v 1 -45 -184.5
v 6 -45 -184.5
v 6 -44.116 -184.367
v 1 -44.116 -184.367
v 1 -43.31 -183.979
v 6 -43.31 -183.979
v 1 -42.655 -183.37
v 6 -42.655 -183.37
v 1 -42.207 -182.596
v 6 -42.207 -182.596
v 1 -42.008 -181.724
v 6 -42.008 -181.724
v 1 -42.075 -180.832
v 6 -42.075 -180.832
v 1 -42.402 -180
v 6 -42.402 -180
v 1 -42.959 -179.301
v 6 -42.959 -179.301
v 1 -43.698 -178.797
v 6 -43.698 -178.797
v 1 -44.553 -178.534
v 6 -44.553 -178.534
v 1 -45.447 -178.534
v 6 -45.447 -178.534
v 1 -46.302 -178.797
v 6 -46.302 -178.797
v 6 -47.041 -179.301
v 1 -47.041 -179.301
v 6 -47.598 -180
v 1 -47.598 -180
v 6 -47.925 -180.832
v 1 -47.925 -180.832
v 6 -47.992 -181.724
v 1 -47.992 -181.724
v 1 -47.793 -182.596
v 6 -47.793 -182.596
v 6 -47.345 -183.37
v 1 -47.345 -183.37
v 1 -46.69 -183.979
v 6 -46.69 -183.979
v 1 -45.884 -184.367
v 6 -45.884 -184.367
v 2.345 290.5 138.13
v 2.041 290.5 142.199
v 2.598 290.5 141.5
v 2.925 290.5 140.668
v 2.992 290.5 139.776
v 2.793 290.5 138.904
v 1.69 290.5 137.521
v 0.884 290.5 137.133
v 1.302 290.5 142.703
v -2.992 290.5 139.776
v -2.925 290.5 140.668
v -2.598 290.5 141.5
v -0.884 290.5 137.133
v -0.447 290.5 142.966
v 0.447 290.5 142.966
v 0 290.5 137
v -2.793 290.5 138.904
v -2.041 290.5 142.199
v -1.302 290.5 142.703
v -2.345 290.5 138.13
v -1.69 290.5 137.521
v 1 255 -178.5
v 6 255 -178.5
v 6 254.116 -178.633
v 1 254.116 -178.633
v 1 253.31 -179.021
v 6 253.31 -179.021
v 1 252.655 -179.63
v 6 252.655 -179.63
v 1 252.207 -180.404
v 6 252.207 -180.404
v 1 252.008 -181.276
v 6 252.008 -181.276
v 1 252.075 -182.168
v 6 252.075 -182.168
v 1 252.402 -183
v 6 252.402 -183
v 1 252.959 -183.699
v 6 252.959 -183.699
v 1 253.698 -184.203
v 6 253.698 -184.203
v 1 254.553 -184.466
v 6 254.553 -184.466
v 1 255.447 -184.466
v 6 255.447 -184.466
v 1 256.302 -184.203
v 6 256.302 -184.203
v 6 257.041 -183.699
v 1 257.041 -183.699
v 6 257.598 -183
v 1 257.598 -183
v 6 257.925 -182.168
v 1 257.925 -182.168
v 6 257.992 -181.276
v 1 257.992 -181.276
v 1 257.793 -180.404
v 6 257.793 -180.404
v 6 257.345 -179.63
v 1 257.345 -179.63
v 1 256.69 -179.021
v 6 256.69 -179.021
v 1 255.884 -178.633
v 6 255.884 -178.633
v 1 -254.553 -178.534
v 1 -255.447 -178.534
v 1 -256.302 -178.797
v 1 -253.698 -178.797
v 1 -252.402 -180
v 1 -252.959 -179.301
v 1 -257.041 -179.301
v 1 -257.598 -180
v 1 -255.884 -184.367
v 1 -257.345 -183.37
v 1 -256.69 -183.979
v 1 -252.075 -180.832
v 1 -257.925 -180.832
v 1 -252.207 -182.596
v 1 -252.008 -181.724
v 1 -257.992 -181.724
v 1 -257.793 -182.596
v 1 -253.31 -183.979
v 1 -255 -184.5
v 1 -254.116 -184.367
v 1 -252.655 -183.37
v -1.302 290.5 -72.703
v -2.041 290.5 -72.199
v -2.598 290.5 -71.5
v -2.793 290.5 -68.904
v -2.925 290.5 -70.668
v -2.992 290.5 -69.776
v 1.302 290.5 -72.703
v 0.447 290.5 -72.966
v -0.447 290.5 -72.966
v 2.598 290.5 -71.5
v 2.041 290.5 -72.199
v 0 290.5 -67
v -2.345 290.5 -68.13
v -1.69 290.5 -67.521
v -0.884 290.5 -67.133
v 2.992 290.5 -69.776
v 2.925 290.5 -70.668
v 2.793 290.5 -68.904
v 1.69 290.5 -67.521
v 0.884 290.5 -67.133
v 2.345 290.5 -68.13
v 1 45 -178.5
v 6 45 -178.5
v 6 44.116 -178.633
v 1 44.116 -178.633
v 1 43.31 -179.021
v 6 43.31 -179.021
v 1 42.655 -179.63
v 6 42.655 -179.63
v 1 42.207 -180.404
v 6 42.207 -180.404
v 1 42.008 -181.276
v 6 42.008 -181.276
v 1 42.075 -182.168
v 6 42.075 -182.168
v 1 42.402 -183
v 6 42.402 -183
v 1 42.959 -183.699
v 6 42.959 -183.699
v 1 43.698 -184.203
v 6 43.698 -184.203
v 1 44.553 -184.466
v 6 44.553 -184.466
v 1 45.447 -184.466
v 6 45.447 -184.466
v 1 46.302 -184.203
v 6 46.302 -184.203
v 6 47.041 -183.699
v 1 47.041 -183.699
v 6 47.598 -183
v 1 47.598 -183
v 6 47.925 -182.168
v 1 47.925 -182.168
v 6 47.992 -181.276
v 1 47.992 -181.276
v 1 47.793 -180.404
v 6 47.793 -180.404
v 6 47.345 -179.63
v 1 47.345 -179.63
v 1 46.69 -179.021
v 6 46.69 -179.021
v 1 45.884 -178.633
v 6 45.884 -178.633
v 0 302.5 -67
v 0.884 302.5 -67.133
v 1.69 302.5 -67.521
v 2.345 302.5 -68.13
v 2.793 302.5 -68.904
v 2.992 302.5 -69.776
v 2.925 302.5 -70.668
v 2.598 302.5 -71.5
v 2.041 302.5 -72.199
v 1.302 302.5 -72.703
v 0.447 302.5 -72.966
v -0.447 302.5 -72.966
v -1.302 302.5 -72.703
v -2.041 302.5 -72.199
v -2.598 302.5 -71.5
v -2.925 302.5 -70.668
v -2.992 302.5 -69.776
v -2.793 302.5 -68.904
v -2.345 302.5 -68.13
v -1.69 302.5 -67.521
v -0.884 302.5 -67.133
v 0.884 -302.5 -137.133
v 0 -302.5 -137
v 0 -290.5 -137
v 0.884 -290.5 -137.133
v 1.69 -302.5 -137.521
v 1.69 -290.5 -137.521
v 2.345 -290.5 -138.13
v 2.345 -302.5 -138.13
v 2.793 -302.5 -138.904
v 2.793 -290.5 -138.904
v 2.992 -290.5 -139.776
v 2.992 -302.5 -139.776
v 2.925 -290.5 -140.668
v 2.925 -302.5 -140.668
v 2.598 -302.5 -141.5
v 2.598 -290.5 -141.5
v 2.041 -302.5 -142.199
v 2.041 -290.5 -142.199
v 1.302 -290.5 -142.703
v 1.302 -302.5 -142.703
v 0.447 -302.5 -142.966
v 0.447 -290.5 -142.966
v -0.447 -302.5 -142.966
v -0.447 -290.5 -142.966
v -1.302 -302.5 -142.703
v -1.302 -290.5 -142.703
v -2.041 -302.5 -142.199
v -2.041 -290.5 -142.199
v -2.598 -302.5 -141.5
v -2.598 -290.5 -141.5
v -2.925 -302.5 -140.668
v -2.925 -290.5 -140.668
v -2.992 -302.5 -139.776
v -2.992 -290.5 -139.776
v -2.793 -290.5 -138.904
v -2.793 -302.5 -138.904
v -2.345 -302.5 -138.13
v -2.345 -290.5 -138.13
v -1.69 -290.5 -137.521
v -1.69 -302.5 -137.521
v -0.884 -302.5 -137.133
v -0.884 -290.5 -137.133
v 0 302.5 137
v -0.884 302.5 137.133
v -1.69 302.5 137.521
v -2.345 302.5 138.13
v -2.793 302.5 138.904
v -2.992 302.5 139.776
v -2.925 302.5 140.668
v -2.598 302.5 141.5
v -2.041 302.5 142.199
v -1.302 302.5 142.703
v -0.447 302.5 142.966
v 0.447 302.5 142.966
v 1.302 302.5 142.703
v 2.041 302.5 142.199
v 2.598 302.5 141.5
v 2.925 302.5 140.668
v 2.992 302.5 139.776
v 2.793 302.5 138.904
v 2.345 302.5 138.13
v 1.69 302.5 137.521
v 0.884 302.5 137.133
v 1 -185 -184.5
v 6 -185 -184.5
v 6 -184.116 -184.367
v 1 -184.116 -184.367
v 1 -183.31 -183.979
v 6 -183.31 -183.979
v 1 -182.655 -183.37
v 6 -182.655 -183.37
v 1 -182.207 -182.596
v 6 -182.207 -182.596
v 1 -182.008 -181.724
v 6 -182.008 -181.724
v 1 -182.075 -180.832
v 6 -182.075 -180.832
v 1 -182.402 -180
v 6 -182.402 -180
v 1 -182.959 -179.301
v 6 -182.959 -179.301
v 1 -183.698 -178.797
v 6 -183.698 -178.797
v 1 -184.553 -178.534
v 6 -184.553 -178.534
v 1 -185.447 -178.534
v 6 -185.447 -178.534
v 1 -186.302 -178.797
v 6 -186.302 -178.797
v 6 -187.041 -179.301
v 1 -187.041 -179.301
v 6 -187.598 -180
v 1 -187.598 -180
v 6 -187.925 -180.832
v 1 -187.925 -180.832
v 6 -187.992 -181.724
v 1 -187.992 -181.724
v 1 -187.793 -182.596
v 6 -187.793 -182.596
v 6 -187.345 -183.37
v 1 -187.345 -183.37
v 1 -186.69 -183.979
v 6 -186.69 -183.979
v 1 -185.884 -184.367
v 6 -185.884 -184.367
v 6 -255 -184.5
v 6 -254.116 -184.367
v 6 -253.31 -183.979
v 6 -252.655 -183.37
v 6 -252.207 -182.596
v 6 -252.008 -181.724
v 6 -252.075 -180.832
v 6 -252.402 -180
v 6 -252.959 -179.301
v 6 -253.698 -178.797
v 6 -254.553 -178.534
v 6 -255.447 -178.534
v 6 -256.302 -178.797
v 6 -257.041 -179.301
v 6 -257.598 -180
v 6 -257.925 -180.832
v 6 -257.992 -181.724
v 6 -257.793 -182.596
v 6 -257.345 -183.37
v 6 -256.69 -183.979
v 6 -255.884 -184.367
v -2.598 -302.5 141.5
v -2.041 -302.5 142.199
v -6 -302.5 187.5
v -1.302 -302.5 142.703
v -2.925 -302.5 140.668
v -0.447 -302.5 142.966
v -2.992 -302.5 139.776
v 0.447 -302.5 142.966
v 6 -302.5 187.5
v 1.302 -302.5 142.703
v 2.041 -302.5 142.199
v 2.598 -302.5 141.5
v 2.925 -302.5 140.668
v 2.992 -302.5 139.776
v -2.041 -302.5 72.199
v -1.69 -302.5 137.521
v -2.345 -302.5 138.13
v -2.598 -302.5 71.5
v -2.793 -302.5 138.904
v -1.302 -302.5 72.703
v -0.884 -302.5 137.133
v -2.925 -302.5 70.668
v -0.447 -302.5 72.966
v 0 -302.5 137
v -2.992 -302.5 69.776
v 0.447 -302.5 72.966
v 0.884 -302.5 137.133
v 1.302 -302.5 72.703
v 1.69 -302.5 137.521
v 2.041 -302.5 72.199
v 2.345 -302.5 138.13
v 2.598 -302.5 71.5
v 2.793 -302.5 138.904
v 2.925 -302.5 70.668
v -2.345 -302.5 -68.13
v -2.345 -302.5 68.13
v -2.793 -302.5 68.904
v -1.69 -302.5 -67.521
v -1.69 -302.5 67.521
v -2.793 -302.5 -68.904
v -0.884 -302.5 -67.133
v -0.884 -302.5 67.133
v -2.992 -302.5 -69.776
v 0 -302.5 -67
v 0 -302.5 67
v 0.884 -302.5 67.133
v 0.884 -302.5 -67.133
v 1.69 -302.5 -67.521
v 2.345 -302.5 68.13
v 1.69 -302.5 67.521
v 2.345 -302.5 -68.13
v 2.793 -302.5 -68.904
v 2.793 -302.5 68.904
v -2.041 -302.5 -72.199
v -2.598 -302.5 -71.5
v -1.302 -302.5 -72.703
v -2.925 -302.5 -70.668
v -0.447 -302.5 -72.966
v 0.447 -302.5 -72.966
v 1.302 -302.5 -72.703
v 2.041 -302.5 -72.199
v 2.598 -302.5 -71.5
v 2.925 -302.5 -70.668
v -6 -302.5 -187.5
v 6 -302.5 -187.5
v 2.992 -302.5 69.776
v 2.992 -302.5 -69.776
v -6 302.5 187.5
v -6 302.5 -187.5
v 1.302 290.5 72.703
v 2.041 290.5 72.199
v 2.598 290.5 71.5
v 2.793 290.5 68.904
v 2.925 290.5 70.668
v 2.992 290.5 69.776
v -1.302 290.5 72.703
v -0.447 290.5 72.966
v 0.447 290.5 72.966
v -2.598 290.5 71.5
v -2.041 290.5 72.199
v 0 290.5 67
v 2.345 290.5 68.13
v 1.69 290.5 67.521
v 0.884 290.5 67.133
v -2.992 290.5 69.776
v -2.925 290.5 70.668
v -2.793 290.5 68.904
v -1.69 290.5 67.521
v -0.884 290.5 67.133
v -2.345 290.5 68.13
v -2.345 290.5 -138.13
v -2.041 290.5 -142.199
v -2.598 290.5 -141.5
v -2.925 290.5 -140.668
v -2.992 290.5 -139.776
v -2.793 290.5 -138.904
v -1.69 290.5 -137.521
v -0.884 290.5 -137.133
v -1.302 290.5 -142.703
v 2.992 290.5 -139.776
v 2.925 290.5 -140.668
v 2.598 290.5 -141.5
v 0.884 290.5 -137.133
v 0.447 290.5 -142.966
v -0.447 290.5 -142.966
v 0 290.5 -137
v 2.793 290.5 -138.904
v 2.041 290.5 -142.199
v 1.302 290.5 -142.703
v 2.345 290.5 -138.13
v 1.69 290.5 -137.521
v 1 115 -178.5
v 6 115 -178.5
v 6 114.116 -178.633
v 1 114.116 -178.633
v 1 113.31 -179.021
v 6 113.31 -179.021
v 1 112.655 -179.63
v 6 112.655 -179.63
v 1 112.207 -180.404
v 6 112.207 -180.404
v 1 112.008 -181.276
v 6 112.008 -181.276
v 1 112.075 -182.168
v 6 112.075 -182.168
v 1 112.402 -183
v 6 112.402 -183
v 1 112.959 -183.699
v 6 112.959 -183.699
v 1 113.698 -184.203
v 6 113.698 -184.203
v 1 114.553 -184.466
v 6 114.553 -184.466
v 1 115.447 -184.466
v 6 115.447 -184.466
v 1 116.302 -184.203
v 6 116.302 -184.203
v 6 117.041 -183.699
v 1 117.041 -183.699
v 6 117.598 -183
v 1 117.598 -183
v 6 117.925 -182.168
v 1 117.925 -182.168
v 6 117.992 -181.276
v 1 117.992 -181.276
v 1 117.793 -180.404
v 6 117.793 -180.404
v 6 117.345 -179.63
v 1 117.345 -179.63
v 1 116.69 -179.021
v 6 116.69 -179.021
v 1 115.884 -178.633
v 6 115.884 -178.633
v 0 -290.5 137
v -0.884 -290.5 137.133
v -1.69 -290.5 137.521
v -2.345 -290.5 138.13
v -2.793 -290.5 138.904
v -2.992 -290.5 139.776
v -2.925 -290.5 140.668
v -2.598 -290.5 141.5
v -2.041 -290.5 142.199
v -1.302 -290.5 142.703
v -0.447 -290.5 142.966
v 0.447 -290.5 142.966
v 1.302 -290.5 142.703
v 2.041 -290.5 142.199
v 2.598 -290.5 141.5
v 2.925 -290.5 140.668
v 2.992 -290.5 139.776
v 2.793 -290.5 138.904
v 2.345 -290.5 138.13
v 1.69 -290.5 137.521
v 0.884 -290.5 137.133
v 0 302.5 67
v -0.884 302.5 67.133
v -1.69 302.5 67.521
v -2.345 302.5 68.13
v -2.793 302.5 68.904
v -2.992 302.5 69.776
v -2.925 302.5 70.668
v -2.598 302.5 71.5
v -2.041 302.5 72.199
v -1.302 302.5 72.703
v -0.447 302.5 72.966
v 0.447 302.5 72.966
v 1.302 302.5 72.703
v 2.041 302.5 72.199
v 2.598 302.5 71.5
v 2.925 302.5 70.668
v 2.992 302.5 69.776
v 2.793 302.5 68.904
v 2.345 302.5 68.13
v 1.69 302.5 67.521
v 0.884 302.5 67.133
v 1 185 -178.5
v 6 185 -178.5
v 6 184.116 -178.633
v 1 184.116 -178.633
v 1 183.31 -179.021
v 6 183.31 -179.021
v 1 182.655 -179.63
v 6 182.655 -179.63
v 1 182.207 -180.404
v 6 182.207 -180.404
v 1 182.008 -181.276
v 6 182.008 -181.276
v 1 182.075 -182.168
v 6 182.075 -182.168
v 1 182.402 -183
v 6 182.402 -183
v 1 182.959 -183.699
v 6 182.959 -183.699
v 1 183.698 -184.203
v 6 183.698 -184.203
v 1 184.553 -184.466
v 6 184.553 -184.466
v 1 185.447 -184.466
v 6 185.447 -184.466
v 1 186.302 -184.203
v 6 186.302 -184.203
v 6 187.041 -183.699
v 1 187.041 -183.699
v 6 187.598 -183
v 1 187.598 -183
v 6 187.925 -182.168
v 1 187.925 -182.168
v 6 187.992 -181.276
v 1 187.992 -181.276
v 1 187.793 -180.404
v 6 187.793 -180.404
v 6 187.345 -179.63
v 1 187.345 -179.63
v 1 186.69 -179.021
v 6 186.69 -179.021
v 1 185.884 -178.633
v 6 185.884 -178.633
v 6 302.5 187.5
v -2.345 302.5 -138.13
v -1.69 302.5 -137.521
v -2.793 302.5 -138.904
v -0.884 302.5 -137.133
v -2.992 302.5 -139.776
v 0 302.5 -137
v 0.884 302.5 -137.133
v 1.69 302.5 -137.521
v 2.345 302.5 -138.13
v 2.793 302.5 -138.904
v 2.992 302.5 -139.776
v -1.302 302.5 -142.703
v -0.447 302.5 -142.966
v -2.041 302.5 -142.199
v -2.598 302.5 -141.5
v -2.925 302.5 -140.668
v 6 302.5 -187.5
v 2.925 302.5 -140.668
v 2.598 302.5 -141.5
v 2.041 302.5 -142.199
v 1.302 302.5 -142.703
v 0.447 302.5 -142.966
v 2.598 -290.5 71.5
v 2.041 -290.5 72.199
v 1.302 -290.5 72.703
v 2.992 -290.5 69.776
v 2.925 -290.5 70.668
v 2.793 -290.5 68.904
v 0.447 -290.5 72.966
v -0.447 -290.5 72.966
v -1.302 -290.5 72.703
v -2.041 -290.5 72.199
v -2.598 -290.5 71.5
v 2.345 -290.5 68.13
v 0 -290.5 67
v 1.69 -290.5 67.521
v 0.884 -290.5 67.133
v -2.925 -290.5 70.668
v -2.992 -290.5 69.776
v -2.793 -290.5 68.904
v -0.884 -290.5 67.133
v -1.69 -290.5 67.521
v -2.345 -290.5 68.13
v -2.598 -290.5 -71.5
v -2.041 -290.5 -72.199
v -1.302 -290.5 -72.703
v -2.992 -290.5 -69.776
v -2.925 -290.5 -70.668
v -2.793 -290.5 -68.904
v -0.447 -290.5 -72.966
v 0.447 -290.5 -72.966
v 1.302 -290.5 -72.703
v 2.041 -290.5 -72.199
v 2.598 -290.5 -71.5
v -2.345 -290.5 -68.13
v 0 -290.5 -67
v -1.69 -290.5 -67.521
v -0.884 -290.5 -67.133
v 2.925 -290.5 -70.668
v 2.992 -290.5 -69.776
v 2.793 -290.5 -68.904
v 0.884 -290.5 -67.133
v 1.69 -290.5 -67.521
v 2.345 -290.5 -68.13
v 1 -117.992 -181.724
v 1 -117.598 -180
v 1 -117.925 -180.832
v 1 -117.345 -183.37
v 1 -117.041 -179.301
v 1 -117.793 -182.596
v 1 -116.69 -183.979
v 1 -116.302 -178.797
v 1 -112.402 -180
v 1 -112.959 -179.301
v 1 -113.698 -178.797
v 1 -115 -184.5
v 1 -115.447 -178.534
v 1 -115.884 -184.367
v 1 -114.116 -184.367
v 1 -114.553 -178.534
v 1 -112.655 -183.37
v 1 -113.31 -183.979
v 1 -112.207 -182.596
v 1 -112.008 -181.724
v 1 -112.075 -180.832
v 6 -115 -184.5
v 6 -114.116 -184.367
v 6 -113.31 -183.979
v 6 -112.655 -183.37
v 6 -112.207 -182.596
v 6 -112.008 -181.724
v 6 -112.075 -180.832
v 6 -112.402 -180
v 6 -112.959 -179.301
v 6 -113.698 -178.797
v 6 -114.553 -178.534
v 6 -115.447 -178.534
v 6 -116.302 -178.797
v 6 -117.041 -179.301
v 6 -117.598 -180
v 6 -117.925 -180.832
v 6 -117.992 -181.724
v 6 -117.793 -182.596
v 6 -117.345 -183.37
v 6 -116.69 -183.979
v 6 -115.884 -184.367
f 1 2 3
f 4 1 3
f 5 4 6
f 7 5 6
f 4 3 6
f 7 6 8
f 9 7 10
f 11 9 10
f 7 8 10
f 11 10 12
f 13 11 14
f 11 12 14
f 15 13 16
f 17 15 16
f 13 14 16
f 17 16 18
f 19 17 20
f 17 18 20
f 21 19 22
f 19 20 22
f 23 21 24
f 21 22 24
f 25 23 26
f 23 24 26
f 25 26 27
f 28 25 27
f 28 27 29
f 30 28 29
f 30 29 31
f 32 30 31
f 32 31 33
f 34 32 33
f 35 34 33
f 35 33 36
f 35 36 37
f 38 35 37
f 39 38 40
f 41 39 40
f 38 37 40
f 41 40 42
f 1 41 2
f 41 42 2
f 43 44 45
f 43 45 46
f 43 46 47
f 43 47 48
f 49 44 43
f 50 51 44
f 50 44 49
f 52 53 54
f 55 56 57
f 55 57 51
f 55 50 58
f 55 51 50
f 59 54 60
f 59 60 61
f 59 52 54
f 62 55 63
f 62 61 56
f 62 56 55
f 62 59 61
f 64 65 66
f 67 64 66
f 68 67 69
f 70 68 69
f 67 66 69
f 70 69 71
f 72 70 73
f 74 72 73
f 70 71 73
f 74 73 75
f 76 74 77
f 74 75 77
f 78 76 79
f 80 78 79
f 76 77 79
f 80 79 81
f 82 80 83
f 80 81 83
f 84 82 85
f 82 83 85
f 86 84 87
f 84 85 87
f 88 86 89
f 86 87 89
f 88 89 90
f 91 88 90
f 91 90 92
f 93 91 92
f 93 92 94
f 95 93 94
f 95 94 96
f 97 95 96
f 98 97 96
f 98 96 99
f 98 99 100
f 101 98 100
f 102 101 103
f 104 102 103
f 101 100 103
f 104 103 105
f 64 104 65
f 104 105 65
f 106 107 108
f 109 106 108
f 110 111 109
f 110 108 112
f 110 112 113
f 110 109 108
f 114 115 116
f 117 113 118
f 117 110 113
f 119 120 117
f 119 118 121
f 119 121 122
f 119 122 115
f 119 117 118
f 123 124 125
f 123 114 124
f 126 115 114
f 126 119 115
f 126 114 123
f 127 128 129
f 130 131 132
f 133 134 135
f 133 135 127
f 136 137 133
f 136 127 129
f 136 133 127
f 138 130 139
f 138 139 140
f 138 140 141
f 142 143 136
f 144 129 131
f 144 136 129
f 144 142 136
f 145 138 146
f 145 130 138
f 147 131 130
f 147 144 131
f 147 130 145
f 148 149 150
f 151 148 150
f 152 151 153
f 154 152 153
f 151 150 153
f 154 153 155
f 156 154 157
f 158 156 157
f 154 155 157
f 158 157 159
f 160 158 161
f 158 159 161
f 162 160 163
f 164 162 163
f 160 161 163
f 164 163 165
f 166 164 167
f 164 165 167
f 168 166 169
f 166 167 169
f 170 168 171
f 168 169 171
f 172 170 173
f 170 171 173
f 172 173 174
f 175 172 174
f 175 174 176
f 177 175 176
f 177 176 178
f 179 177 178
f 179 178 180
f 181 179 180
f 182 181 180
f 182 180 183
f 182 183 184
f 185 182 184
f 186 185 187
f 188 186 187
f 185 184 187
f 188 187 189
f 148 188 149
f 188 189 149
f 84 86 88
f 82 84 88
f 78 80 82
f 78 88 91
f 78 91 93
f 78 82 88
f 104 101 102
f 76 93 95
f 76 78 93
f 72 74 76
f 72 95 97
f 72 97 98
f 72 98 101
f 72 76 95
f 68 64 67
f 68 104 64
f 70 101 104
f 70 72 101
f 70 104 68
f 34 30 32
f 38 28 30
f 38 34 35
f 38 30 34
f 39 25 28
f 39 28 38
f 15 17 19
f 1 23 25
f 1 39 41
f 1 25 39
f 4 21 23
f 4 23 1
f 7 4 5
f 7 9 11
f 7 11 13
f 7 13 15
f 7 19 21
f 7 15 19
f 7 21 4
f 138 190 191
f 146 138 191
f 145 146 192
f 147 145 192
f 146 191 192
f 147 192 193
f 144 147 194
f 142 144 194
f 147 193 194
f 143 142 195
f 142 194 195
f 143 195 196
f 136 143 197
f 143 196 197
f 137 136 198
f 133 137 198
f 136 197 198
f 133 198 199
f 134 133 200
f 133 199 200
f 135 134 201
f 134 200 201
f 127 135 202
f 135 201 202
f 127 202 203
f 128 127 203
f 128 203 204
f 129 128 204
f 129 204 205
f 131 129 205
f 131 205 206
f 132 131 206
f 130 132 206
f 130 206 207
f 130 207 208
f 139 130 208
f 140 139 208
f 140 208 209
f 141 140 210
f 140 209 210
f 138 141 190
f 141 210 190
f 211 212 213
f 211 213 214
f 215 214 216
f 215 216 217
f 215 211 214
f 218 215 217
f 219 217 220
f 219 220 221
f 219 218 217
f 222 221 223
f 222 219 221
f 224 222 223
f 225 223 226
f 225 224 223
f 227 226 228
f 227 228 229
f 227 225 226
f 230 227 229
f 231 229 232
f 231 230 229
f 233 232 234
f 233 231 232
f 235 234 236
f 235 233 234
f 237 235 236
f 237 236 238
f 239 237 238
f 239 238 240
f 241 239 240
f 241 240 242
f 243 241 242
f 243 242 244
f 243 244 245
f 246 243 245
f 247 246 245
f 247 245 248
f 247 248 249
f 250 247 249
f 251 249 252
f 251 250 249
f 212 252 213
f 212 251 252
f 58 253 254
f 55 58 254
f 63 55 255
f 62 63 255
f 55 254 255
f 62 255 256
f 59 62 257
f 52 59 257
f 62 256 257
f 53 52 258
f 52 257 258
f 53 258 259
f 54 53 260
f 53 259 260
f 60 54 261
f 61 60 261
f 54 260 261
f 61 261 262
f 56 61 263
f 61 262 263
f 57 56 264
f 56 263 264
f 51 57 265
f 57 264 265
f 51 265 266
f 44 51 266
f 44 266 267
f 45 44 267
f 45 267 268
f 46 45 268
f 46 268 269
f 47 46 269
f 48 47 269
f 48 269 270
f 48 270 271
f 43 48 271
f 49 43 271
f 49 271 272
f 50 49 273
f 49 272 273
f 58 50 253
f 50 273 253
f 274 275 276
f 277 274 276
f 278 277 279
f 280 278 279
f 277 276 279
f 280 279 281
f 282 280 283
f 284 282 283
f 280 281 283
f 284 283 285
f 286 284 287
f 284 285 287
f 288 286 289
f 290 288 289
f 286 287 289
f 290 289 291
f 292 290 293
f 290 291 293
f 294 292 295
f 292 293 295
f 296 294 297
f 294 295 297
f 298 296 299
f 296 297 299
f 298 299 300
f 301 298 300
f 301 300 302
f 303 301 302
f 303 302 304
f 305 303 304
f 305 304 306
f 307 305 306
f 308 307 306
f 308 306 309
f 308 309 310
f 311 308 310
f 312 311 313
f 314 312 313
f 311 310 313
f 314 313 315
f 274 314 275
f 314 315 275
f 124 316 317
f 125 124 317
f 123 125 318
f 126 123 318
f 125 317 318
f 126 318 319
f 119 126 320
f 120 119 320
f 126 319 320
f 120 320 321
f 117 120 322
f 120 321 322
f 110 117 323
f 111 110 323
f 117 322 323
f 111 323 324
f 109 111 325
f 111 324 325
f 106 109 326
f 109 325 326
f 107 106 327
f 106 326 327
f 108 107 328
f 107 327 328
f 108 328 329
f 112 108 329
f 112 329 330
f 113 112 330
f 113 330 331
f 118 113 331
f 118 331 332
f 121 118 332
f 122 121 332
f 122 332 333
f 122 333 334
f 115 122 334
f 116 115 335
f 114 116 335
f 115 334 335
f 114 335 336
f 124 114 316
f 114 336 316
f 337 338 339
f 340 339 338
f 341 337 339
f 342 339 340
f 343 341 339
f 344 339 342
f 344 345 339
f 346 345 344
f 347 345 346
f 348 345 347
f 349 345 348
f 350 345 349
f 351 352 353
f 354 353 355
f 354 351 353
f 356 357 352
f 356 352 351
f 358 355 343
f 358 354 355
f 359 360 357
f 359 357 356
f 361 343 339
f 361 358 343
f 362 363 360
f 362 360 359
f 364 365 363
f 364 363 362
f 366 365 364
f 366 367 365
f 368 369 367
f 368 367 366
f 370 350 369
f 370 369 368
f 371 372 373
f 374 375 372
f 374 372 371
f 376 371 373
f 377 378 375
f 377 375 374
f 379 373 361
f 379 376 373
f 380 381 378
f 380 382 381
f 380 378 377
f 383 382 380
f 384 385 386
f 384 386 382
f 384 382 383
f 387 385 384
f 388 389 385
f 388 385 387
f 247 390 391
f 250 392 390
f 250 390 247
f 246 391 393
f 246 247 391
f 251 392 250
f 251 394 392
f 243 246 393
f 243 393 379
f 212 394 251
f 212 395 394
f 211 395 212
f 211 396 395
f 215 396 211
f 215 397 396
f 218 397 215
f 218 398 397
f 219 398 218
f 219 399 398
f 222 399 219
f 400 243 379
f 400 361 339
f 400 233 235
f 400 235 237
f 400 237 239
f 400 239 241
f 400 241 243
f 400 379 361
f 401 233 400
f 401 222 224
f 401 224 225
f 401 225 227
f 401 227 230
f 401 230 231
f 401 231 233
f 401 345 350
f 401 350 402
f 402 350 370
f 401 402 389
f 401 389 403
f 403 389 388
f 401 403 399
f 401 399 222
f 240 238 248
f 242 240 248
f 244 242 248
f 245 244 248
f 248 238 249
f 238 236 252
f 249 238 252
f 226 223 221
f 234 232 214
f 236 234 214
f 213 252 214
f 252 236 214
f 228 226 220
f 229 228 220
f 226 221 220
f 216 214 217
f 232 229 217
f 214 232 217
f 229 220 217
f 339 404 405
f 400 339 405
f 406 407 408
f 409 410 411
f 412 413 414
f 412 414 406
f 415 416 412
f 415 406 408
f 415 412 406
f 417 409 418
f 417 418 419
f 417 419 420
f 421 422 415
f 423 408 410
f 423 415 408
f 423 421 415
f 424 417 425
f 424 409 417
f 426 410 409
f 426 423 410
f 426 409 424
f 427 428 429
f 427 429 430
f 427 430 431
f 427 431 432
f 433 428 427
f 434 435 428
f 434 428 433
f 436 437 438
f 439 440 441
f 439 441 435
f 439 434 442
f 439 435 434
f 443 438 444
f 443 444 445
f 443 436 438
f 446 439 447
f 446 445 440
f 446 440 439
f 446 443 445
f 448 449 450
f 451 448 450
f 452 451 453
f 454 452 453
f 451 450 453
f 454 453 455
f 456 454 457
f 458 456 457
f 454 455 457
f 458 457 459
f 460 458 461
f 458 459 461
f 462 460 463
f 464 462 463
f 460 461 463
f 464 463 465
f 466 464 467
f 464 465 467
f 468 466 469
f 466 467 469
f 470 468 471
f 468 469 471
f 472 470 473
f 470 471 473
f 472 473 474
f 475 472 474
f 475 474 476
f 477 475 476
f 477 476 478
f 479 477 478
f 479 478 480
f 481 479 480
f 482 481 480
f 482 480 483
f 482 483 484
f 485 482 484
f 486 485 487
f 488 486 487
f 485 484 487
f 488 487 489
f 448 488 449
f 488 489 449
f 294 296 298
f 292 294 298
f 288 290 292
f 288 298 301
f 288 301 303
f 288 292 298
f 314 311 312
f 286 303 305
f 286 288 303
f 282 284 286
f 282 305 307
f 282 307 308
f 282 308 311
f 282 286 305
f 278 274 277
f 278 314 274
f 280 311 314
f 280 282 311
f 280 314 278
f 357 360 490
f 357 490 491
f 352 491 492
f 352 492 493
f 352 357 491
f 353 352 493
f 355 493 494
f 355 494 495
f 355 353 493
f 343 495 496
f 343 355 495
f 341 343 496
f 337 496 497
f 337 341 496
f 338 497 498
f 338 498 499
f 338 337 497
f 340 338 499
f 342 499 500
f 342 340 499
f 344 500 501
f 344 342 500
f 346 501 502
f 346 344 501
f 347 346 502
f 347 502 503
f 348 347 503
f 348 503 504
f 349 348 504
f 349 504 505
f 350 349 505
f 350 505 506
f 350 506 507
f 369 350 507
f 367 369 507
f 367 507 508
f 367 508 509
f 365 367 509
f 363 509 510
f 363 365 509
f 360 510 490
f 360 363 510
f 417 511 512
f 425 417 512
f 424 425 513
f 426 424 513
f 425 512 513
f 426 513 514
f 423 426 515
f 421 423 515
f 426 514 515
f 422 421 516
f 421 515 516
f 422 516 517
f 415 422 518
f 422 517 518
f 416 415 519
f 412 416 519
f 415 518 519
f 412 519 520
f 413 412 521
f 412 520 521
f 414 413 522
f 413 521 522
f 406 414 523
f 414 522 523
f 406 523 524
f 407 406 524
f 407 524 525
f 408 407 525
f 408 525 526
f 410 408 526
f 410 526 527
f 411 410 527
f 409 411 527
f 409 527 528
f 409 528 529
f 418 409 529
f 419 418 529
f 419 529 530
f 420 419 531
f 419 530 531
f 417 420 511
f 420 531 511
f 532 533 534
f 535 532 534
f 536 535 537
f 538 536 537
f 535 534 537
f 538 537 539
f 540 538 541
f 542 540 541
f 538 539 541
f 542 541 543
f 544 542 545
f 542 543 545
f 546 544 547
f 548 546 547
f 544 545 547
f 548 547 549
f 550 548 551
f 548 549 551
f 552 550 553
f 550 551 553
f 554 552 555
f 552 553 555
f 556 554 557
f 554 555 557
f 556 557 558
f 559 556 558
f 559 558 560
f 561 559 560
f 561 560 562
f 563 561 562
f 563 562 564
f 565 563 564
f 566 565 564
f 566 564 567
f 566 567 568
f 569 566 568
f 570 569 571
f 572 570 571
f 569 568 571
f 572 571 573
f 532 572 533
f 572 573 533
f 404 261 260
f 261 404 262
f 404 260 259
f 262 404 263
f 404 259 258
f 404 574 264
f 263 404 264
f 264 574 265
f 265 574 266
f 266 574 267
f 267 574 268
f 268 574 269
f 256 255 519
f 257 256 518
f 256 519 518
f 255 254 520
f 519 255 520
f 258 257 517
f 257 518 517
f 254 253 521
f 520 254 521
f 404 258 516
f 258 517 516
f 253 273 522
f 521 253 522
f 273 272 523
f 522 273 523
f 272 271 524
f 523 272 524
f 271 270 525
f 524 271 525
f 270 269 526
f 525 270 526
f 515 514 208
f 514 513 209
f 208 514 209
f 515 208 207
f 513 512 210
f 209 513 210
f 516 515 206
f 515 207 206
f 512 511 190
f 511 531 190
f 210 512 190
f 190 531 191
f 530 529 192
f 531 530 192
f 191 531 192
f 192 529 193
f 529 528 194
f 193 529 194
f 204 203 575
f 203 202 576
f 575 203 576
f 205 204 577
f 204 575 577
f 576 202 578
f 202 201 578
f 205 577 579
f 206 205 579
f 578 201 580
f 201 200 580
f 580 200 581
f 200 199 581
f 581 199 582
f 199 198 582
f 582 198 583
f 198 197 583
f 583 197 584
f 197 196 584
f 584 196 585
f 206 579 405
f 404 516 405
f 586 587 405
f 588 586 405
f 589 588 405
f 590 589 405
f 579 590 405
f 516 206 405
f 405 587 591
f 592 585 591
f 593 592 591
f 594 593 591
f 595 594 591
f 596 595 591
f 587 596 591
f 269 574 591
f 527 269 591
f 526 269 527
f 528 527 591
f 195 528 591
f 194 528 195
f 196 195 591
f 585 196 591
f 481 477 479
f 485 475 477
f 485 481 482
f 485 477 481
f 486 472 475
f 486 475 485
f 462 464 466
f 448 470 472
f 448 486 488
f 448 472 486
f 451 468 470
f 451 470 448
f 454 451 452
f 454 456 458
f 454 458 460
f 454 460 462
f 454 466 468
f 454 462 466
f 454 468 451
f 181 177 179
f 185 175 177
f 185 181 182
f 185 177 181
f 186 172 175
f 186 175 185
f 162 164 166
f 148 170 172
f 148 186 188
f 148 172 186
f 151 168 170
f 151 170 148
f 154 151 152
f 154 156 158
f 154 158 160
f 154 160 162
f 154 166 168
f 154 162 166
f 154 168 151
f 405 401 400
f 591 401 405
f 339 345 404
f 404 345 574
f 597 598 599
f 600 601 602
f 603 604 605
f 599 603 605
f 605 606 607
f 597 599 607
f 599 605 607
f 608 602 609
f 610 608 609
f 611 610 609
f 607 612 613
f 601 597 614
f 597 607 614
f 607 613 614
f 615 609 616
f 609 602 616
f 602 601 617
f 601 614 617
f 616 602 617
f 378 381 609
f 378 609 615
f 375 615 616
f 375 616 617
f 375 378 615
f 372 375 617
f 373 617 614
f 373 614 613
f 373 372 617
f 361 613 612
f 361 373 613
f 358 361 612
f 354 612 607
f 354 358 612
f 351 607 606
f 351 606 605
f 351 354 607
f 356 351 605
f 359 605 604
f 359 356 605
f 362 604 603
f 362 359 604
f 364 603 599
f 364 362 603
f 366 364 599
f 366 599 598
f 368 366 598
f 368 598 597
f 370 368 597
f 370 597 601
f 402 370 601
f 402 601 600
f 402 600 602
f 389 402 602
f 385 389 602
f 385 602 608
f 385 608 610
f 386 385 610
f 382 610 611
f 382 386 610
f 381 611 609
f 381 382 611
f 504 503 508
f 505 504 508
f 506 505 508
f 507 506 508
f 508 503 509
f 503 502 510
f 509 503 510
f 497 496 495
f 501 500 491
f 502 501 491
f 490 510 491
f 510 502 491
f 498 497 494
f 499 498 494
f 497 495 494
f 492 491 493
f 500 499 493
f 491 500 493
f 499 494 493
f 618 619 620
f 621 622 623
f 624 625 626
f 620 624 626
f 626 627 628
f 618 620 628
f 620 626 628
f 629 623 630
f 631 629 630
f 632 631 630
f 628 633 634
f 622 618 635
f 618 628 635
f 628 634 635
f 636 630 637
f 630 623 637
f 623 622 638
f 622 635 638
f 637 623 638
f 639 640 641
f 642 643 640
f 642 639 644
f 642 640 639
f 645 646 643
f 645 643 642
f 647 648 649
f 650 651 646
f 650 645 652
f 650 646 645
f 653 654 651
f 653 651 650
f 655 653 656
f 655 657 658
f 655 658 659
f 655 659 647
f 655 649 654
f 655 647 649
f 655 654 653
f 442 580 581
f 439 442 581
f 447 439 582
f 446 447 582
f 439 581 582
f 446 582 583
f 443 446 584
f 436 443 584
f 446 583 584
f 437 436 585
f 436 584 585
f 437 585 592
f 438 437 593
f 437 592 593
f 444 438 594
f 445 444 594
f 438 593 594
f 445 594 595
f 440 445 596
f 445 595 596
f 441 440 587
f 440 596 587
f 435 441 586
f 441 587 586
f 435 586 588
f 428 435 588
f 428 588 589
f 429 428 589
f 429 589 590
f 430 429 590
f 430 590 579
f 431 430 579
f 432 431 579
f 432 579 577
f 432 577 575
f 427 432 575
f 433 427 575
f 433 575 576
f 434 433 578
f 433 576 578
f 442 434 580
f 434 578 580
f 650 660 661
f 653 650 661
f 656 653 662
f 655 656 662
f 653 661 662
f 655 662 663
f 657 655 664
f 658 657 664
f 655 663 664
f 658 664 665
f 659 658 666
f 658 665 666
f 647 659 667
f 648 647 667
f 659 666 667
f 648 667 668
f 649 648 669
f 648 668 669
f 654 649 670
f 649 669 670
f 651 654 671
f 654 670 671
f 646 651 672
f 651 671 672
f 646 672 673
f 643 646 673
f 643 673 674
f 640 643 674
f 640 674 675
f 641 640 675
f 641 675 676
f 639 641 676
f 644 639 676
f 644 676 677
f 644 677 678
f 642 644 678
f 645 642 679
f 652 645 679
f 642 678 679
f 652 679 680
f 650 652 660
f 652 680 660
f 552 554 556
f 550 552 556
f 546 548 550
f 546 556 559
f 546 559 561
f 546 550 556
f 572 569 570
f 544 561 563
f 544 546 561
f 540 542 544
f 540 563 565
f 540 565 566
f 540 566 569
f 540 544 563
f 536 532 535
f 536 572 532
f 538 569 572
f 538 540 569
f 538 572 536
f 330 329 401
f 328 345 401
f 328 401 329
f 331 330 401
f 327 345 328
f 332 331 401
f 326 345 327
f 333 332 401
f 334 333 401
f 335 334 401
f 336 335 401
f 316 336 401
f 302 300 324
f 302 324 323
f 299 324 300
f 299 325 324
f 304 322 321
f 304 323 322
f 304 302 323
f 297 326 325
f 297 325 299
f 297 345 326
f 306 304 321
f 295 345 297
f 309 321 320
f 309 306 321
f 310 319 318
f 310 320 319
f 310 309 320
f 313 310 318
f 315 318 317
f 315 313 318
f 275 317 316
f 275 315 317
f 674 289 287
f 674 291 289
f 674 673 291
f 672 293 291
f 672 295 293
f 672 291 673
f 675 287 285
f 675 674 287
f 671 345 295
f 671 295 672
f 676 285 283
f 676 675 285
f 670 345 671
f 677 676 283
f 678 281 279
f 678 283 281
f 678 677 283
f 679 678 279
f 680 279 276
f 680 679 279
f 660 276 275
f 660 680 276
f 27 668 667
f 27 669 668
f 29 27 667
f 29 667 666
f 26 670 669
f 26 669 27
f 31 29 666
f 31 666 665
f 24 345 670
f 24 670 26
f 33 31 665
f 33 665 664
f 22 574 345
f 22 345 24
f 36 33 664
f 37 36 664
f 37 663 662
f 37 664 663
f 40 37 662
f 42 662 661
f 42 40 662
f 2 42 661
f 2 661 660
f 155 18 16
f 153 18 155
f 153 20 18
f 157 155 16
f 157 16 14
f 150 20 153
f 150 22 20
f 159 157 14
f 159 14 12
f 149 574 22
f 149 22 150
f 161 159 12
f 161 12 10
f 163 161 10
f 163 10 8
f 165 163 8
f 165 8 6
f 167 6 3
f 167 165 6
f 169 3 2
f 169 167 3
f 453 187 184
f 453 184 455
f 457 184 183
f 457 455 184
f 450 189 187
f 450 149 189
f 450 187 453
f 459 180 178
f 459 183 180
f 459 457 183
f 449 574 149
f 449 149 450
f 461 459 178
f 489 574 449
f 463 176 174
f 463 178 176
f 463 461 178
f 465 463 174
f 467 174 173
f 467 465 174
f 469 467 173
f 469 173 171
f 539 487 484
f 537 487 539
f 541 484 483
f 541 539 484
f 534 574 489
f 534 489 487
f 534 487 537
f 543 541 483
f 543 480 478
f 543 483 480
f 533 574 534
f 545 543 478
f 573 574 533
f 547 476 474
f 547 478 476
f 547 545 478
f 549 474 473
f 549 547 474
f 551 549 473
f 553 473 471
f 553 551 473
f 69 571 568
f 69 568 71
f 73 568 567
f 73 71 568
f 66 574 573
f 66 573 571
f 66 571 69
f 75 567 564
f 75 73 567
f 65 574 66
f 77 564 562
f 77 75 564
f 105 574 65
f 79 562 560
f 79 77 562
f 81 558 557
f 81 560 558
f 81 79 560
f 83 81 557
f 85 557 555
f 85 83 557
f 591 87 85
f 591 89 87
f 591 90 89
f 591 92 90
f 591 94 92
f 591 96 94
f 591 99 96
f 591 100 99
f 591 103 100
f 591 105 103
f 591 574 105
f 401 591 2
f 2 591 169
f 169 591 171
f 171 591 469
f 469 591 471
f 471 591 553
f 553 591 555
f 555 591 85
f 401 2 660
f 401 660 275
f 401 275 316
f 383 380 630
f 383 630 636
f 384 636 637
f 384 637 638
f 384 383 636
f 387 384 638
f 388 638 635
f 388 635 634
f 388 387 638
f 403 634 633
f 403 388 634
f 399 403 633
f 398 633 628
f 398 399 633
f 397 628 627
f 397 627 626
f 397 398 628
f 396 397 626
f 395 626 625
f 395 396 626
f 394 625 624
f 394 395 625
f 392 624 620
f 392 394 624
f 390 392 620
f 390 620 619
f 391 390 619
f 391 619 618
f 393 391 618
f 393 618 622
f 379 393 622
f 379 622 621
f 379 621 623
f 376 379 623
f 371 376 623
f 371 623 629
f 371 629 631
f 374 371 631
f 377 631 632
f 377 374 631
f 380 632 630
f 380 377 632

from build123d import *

# Parameters (mm, degrees)
CROQUIS2_W              = 375
CROQUIS2_H              = 605
SALIENTE_EXTRUIR1_DEPTH = 6
CROQUIS3_R              = 3
CORTAR_EXTRUIR1_DEPTH   = 12
CROQUIS6_R              = 3
CORTAR_EXTRUIR2_DEPTH   = 5


with BuildPart() as part:
    # Croquis2 → Saliente-Extruir1 (new, symmetric)
    with BuildSketch(Plane(origin=(0, 0, 0), x_dir=(0, 0, -1), z_dir=(1, 0, 0))):
        Rectangle(CROQUIS2_W, CROQUIS2_H)
    extrude(amount=SALIENTE_EXTRUIR1_DEPTH, both=True)

    # Croquis3 → Cortar-Extruir1 (cut)
    with BuildSketch(Plane(origin=(0, 302.5, 0), x_dir=(1, 0, 0), z_dir=(0, 1, 0))):
        with Locations(Location((0, 140, 0), (0, 0, 270))):
            Circle(CROQUIS3_R)
        with Locations(Location((0, 70, 0), (0, 0, 270))):
            Circle(CROQUIS3_R)
        with Locations(Location((0, -70, 0), (0, 0, 90))):
            Circle(CROQUIS3_R)
        with Locations(Location((0, -140, 0), (0, 0, 90))):
            Circle(CROQUIS3_R)
    cortar_extruir1 = extrude(amount=-CORTAR_EXTRUIR1_DEPTH, mode=Mode.SUBTRACT)

    # Simetría1: Cortar-Extruir1 across plane
    add(cortar_extruir1.mirror(Plane.ZX), mode=Mode.SUBTRACT)

    # Croquis6 → Cortar-Extruir2 (cut)
    with BuildSketch(Plane(origin=(6, 0, 0), x_dir=(0, 0, -1), z_dir=(1, 0, 0))):
        with Locations((181.5, -255)):
            Circle(CROQUIS6_R)
        with Locations((181.5, -185)):
            Circle(CROQUIS6_R)
        with Locations((181.5, -115)):
            Circle(CROQUIS6_R)
        with Locations((181.5, -45)):
            Circle(CROQUIS6_R)
        with Locations(Location((181.5, 45, 0), (0, 0, 180))):
            Circle(CROQUIS6_R)
        with Locations(Location((181.5, 115, 0), (0, 0, 180))):
            Circle(CROQUIS6_R)
        with Locations(Location((181.5, 185, 0), (0, 0, 180))):
            Circle(CROQUIS6_R)
        with Locations(Location((181.5, 255, 0), (0, 0, 180))):
            Circle(CROQUIS6_R)
    extrude(amount=-CORTAR_EXTRUIR2_DEPTH, mode=Mode.SUBTRACT)


solid = part.part
